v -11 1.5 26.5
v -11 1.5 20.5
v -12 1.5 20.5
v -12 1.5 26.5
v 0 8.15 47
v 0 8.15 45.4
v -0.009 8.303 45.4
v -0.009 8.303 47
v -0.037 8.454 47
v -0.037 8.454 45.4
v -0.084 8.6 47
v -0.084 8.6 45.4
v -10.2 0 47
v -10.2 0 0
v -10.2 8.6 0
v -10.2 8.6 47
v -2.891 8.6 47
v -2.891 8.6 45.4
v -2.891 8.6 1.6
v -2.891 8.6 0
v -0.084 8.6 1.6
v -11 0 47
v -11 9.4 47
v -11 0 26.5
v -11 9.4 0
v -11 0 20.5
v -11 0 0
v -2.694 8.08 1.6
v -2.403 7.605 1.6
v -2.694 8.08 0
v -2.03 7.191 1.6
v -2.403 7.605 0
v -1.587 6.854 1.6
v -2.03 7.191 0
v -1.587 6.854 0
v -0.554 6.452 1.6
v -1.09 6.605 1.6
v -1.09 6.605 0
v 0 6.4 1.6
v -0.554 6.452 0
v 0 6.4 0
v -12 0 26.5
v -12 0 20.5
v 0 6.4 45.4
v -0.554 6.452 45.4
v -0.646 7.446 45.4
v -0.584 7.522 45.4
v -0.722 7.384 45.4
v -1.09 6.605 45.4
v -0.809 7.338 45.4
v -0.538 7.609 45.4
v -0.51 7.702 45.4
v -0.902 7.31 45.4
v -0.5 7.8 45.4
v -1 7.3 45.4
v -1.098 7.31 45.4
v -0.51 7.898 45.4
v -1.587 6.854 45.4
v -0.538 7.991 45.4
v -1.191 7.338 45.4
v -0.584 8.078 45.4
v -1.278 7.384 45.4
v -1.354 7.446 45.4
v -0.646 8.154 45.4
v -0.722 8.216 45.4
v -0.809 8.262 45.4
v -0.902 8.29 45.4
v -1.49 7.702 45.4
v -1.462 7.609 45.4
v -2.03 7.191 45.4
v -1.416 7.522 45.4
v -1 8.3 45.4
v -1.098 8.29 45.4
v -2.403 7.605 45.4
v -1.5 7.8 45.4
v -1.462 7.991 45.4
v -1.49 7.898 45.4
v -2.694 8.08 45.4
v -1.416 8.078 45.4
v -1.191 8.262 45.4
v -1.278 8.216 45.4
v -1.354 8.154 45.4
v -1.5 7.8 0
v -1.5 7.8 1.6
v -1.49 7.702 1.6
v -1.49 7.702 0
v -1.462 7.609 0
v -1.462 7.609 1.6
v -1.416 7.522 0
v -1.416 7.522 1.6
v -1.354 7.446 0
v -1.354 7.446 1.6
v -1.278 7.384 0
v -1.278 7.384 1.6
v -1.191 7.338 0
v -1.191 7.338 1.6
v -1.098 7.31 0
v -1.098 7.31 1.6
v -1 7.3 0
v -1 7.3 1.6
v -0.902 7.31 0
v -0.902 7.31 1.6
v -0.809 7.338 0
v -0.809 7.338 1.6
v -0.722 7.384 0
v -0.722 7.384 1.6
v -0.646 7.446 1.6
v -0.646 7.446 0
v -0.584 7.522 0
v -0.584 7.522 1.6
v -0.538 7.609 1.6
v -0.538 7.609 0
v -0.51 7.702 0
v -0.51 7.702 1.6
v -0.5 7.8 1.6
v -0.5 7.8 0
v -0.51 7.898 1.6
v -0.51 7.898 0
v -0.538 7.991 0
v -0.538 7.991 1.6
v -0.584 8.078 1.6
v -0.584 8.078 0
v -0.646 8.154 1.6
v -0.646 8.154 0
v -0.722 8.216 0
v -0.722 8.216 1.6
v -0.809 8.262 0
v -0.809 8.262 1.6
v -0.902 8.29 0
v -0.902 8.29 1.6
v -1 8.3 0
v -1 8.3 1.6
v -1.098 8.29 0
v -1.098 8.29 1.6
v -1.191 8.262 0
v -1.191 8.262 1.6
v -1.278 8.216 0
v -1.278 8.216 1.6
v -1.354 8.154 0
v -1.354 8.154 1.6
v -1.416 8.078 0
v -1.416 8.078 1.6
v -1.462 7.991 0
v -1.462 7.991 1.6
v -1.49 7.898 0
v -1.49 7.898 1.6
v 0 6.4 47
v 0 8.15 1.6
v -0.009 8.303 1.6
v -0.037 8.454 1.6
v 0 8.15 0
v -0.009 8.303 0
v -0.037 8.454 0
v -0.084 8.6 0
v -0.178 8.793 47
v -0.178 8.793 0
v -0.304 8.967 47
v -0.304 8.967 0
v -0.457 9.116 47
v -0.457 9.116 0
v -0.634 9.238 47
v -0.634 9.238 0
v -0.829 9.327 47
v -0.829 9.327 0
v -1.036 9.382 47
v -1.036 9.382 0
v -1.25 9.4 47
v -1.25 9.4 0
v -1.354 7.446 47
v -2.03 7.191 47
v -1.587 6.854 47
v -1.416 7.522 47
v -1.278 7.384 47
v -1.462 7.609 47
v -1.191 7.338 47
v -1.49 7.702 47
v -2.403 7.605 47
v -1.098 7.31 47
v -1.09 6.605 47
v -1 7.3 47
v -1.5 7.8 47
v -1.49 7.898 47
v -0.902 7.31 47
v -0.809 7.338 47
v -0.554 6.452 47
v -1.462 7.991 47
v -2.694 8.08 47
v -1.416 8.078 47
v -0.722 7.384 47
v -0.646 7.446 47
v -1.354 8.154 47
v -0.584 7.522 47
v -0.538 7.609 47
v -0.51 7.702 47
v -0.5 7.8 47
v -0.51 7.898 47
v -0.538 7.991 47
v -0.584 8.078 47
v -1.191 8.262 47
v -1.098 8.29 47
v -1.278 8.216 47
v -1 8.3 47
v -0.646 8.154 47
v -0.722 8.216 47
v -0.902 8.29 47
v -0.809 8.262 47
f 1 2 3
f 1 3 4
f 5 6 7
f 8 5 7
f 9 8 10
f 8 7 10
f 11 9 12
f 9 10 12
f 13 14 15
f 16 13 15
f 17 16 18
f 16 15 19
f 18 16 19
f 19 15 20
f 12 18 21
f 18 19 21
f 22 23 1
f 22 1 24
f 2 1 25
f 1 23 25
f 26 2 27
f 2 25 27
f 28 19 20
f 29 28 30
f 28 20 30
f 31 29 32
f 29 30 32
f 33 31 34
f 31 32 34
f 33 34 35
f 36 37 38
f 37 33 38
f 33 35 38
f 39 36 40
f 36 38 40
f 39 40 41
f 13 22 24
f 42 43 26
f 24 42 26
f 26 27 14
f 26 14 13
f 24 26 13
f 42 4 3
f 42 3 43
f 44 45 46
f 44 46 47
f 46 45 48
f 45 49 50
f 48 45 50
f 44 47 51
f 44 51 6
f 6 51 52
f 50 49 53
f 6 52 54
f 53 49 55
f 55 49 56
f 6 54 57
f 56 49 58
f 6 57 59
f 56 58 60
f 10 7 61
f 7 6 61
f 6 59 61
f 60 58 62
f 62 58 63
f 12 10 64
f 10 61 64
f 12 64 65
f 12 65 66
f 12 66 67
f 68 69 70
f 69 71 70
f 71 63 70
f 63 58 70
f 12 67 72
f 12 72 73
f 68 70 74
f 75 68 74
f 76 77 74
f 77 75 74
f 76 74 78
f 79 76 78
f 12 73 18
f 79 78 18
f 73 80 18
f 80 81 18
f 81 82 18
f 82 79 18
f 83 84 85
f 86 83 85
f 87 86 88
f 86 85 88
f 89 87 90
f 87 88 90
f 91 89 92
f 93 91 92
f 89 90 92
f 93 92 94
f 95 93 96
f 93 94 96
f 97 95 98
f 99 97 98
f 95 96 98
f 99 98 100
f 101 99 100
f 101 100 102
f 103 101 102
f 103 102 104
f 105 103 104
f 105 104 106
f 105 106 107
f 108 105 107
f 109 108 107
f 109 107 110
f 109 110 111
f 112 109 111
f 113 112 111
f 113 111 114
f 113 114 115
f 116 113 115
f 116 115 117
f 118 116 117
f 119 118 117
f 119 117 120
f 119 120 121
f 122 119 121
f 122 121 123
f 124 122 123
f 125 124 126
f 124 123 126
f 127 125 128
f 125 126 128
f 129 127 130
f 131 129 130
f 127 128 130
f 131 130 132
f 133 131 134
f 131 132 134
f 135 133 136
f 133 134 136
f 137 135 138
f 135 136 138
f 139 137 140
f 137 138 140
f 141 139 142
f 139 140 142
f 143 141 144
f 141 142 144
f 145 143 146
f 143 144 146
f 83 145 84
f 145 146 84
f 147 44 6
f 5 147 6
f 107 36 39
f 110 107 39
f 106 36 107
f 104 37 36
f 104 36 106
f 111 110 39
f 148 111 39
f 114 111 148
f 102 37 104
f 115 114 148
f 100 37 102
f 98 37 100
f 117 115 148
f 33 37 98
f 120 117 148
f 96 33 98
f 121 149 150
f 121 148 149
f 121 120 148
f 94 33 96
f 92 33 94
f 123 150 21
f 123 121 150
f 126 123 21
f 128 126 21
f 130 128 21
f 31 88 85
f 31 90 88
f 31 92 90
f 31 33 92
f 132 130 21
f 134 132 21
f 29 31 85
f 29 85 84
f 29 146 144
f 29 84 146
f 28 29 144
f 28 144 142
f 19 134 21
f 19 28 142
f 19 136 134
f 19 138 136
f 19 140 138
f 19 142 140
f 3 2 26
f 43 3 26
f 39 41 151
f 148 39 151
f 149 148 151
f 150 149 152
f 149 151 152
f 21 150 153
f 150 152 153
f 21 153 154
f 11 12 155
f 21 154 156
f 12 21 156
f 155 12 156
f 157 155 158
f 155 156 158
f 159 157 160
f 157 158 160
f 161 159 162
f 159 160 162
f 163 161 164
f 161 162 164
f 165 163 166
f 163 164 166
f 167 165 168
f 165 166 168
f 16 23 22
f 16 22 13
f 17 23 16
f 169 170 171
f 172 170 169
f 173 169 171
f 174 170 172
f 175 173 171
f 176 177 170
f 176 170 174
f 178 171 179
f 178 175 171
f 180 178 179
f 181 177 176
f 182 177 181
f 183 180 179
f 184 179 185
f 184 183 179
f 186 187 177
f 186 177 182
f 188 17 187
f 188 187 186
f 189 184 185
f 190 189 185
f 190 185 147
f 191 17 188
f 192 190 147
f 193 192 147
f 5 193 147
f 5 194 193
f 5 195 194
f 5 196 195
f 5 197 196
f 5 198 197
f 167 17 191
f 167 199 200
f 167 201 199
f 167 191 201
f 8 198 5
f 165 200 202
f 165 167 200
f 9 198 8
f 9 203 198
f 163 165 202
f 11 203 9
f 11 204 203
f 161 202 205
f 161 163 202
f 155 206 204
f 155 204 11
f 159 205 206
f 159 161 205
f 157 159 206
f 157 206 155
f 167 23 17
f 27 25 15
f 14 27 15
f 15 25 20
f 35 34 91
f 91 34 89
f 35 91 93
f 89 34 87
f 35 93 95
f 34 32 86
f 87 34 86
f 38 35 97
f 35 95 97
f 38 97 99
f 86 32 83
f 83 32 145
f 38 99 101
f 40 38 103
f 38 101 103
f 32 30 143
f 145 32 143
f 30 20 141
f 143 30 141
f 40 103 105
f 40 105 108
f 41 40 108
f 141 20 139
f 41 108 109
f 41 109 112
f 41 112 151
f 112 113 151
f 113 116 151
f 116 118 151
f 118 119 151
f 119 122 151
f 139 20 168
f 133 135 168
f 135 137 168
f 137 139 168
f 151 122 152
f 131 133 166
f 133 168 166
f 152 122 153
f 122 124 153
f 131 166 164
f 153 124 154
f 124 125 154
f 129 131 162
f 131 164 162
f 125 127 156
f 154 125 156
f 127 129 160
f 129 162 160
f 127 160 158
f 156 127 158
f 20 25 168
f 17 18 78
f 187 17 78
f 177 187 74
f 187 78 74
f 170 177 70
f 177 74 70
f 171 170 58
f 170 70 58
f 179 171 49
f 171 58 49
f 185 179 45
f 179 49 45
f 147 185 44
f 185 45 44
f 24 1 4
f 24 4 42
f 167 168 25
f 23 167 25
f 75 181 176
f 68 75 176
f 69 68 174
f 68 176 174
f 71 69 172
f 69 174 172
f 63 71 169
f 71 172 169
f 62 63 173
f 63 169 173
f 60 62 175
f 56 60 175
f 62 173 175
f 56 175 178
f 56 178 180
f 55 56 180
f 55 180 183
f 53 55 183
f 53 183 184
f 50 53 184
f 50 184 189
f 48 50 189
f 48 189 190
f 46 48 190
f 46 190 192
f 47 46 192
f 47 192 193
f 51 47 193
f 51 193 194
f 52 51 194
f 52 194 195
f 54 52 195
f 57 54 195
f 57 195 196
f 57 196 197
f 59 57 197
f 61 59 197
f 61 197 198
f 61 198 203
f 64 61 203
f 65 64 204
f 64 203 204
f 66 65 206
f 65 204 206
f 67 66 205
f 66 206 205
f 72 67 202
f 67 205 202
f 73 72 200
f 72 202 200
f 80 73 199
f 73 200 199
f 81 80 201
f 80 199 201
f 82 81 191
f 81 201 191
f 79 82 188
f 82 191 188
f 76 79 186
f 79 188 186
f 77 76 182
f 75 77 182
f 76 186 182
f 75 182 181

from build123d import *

# Parameters (mm, degrees)
F1_DEPTH = 47
F2_W     = 8.6
F2_H     = 43.8
F3_DEPTH = 25
F4_D     = 1
F5_W     = 1.5
F5_H     = 6
F6_DEPTH = 1


with BuildPart() as f1:
    # F0 (on Top) → F1 (new body)
    with BuildSketch(Plane.XY):
        with BuildLine():
            ThreePointArc((-2.891366459, 8.6), (-1.8165902125, 7.0125327227), (0, 6.4))
            Line((0, 6.4), (0, 8.15))
            ThreePointArc((0, 8.15), (-0.0211310131, 8.3788689869), (-0.083809621, 8.6))
            Line((-0.083809621, 8.6), (-2.891366459, 8.6))
        make_face()
        with BuildLine():
            Line((-10.2, 9.4), (-10.2, 8.6))
            Line((-10.2, 8.6), (-2.891366459, 8.6))
            Line((-2.891366459, 8.6), (-0.083809621, 8.6))
            ThreePointArc((-0.083809621, 8.6), (-0.5428932188, 9.1807764064), (-1.25, 9.4))
            Line((-1.25, 9.4), (-10.2, 9.4))
        make_face()
        Polygon((-11, 0), (-10.2, 0), (-10.2, 8.6), (-10.2, 9.4), (-11, 9.4), align=None)
    extrude(amount=F1_DEPTH)

    # F2 (on face) → F3 (cut)
    with BuildSketch(Plane.YZ.offset(-10.2)):
        with Locations((4.3, 23.5)):
            Rectangle(F2_W, F2_H)
    extrude(amount=F3_DEPTH, mode=Mode.SUBTRACT)

    # F4 (through all)
    with Locations(Plane(origin=(0, 0, 0), x_dir=(1, 0, 0), z_dir=(0, 0, -1))):
        with Locations((-1, -7.8)):
            Hole(F4_D / 2)

    # F5 (on face) → F6 (join)
    with BuildSketch(Plane(origin=(-11, 0, 0), x_dir=(0, -1, 0), z_dir=(-1, 0, 0))):
        with Locations((-0.75, 23.5)):
            Rectangle(F5_W, F5_H)
    extrude(amount=F6_DEPTH)


solid = f1.part
